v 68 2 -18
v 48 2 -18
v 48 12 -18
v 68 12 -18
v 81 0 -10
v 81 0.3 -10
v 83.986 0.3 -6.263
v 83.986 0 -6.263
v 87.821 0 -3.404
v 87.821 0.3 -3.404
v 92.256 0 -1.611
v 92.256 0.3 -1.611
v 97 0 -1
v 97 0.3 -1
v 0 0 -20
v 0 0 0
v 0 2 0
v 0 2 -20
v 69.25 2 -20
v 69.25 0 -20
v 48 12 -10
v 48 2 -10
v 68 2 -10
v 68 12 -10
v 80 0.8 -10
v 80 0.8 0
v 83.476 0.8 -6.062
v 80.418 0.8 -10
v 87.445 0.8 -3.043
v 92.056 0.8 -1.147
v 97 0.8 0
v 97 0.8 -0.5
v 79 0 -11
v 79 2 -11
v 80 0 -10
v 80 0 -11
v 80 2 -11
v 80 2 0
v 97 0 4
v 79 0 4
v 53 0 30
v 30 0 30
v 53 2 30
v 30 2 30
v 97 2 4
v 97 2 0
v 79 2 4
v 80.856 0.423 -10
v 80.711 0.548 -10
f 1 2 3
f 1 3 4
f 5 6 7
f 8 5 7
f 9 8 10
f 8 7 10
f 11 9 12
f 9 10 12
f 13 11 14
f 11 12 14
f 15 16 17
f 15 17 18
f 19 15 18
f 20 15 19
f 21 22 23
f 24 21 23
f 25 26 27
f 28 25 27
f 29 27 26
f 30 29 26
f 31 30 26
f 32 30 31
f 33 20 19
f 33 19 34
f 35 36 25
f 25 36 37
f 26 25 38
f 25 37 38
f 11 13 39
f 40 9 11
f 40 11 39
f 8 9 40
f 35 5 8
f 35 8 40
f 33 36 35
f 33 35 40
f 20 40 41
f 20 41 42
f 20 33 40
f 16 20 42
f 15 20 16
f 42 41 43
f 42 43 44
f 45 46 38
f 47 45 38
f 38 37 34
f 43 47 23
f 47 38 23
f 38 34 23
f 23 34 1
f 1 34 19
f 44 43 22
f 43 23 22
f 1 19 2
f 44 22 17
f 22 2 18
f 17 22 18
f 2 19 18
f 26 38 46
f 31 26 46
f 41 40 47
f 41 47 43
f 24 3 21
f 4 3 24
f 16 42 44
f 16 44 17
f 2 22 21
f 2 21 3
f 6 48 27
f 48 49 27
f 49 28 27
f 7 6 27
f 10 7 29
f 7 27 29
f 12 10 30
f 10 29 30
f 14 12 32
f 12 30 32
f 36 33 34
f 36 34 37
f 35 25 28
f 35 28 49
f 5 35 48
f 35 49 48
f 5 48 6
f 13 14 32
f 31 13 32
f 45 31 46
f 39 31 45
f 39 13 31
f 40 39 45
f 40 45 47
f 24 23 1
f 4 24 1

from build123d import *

# Parameters (mm, degrees)
SALIENTE_EXTRUIR2_DEPTH = 2
CROQUIS3_W              = 17
CROQUIS3_H              = 11
CORTAR_EXTRUIR1_DEPTH   = 1.2
CORTAR_EXTRUIR2_DEPTH   = 1.8
CROQUIS5_W              = 20
CROQUIS5_H              = 8
SALIENTE_EXTRUIR3_DEPTH = 10
CHAFL_N1_SIZE           = 0.5


with BuildPart() as part:
    # Croquis1 → Saliente-Extruir2 (new body)
    with BuildSketch(Plane(origin=(0, 0, 0), x_dir=(1, 0, 0), z_dir=(0, 1, 0))):
        Polygon((0, 0), (0, 20), (69.25, 20), (79, 11), (97, 11), (97, -4), (79, -4), (53, -30), (30, -30), align=None)
    extrude(amount=SALIENTE_EXTRUIR2_DEPTH)

    # Croquis3 → Cortar-Extruir1 (cut)
    with BuildSketch(Plane(origin=(0, 2, 0), x_dir=(1, 0, 0), z_dir=(0, 1, 0))):
        with Locations((88.5, 5.5)):
            Rectangle(CROQUIS3_W, CROQUIS3_H)
    extrude(amount=-CORTAR_EXTRUIR1_DEPTH, mode=Mode.SUBTRACT)

    # Croquis4 → Cortar-Extruir2 (cut, through all)
    with BuildSketch(Plane(origin=(0, 0.8, 0), x_dir=(1, 0, 0), z_dir=(0, 1, 0))):
        with BuildLine():
            Line((80, 11), (80, 10))
            Line((80, 10), (81, 10))
            ThreePointArc((81, 10), (87.821220125, 3.404391333), (97, 1))
            Line((97, 1), (97, 11))
            Line((97, 11), (80, 11))
        make_face()
    extrude(amount=-CORTAR_EXTRUIR2_DEPTH, mode=Mode.SUBTRACT)

    # Croquis5 → Saliente-Extruir3 (add)
    with BuildSketch(Plane(origin=(0, 2, 0), x_dir=(1, 0, 0), z_dir=(0, 1, 0))):
        with Locations((58, 14)):
            Rectangle(CROQUIS5_W, CROQUIS5_H)
    extrude(amount=SALIENTE_EXTRUIR3_DEPTH)

    # Chaflán1
    chafl_n1_edges = [part.edges().sort_by_distance(p)[0] for p in [
        (87.821220125, 0.8, -3.404391333),
    ]]
    chamfer(chafl_n1_edges, length=CHAFL_N1_SIZE)


solid = part.part
